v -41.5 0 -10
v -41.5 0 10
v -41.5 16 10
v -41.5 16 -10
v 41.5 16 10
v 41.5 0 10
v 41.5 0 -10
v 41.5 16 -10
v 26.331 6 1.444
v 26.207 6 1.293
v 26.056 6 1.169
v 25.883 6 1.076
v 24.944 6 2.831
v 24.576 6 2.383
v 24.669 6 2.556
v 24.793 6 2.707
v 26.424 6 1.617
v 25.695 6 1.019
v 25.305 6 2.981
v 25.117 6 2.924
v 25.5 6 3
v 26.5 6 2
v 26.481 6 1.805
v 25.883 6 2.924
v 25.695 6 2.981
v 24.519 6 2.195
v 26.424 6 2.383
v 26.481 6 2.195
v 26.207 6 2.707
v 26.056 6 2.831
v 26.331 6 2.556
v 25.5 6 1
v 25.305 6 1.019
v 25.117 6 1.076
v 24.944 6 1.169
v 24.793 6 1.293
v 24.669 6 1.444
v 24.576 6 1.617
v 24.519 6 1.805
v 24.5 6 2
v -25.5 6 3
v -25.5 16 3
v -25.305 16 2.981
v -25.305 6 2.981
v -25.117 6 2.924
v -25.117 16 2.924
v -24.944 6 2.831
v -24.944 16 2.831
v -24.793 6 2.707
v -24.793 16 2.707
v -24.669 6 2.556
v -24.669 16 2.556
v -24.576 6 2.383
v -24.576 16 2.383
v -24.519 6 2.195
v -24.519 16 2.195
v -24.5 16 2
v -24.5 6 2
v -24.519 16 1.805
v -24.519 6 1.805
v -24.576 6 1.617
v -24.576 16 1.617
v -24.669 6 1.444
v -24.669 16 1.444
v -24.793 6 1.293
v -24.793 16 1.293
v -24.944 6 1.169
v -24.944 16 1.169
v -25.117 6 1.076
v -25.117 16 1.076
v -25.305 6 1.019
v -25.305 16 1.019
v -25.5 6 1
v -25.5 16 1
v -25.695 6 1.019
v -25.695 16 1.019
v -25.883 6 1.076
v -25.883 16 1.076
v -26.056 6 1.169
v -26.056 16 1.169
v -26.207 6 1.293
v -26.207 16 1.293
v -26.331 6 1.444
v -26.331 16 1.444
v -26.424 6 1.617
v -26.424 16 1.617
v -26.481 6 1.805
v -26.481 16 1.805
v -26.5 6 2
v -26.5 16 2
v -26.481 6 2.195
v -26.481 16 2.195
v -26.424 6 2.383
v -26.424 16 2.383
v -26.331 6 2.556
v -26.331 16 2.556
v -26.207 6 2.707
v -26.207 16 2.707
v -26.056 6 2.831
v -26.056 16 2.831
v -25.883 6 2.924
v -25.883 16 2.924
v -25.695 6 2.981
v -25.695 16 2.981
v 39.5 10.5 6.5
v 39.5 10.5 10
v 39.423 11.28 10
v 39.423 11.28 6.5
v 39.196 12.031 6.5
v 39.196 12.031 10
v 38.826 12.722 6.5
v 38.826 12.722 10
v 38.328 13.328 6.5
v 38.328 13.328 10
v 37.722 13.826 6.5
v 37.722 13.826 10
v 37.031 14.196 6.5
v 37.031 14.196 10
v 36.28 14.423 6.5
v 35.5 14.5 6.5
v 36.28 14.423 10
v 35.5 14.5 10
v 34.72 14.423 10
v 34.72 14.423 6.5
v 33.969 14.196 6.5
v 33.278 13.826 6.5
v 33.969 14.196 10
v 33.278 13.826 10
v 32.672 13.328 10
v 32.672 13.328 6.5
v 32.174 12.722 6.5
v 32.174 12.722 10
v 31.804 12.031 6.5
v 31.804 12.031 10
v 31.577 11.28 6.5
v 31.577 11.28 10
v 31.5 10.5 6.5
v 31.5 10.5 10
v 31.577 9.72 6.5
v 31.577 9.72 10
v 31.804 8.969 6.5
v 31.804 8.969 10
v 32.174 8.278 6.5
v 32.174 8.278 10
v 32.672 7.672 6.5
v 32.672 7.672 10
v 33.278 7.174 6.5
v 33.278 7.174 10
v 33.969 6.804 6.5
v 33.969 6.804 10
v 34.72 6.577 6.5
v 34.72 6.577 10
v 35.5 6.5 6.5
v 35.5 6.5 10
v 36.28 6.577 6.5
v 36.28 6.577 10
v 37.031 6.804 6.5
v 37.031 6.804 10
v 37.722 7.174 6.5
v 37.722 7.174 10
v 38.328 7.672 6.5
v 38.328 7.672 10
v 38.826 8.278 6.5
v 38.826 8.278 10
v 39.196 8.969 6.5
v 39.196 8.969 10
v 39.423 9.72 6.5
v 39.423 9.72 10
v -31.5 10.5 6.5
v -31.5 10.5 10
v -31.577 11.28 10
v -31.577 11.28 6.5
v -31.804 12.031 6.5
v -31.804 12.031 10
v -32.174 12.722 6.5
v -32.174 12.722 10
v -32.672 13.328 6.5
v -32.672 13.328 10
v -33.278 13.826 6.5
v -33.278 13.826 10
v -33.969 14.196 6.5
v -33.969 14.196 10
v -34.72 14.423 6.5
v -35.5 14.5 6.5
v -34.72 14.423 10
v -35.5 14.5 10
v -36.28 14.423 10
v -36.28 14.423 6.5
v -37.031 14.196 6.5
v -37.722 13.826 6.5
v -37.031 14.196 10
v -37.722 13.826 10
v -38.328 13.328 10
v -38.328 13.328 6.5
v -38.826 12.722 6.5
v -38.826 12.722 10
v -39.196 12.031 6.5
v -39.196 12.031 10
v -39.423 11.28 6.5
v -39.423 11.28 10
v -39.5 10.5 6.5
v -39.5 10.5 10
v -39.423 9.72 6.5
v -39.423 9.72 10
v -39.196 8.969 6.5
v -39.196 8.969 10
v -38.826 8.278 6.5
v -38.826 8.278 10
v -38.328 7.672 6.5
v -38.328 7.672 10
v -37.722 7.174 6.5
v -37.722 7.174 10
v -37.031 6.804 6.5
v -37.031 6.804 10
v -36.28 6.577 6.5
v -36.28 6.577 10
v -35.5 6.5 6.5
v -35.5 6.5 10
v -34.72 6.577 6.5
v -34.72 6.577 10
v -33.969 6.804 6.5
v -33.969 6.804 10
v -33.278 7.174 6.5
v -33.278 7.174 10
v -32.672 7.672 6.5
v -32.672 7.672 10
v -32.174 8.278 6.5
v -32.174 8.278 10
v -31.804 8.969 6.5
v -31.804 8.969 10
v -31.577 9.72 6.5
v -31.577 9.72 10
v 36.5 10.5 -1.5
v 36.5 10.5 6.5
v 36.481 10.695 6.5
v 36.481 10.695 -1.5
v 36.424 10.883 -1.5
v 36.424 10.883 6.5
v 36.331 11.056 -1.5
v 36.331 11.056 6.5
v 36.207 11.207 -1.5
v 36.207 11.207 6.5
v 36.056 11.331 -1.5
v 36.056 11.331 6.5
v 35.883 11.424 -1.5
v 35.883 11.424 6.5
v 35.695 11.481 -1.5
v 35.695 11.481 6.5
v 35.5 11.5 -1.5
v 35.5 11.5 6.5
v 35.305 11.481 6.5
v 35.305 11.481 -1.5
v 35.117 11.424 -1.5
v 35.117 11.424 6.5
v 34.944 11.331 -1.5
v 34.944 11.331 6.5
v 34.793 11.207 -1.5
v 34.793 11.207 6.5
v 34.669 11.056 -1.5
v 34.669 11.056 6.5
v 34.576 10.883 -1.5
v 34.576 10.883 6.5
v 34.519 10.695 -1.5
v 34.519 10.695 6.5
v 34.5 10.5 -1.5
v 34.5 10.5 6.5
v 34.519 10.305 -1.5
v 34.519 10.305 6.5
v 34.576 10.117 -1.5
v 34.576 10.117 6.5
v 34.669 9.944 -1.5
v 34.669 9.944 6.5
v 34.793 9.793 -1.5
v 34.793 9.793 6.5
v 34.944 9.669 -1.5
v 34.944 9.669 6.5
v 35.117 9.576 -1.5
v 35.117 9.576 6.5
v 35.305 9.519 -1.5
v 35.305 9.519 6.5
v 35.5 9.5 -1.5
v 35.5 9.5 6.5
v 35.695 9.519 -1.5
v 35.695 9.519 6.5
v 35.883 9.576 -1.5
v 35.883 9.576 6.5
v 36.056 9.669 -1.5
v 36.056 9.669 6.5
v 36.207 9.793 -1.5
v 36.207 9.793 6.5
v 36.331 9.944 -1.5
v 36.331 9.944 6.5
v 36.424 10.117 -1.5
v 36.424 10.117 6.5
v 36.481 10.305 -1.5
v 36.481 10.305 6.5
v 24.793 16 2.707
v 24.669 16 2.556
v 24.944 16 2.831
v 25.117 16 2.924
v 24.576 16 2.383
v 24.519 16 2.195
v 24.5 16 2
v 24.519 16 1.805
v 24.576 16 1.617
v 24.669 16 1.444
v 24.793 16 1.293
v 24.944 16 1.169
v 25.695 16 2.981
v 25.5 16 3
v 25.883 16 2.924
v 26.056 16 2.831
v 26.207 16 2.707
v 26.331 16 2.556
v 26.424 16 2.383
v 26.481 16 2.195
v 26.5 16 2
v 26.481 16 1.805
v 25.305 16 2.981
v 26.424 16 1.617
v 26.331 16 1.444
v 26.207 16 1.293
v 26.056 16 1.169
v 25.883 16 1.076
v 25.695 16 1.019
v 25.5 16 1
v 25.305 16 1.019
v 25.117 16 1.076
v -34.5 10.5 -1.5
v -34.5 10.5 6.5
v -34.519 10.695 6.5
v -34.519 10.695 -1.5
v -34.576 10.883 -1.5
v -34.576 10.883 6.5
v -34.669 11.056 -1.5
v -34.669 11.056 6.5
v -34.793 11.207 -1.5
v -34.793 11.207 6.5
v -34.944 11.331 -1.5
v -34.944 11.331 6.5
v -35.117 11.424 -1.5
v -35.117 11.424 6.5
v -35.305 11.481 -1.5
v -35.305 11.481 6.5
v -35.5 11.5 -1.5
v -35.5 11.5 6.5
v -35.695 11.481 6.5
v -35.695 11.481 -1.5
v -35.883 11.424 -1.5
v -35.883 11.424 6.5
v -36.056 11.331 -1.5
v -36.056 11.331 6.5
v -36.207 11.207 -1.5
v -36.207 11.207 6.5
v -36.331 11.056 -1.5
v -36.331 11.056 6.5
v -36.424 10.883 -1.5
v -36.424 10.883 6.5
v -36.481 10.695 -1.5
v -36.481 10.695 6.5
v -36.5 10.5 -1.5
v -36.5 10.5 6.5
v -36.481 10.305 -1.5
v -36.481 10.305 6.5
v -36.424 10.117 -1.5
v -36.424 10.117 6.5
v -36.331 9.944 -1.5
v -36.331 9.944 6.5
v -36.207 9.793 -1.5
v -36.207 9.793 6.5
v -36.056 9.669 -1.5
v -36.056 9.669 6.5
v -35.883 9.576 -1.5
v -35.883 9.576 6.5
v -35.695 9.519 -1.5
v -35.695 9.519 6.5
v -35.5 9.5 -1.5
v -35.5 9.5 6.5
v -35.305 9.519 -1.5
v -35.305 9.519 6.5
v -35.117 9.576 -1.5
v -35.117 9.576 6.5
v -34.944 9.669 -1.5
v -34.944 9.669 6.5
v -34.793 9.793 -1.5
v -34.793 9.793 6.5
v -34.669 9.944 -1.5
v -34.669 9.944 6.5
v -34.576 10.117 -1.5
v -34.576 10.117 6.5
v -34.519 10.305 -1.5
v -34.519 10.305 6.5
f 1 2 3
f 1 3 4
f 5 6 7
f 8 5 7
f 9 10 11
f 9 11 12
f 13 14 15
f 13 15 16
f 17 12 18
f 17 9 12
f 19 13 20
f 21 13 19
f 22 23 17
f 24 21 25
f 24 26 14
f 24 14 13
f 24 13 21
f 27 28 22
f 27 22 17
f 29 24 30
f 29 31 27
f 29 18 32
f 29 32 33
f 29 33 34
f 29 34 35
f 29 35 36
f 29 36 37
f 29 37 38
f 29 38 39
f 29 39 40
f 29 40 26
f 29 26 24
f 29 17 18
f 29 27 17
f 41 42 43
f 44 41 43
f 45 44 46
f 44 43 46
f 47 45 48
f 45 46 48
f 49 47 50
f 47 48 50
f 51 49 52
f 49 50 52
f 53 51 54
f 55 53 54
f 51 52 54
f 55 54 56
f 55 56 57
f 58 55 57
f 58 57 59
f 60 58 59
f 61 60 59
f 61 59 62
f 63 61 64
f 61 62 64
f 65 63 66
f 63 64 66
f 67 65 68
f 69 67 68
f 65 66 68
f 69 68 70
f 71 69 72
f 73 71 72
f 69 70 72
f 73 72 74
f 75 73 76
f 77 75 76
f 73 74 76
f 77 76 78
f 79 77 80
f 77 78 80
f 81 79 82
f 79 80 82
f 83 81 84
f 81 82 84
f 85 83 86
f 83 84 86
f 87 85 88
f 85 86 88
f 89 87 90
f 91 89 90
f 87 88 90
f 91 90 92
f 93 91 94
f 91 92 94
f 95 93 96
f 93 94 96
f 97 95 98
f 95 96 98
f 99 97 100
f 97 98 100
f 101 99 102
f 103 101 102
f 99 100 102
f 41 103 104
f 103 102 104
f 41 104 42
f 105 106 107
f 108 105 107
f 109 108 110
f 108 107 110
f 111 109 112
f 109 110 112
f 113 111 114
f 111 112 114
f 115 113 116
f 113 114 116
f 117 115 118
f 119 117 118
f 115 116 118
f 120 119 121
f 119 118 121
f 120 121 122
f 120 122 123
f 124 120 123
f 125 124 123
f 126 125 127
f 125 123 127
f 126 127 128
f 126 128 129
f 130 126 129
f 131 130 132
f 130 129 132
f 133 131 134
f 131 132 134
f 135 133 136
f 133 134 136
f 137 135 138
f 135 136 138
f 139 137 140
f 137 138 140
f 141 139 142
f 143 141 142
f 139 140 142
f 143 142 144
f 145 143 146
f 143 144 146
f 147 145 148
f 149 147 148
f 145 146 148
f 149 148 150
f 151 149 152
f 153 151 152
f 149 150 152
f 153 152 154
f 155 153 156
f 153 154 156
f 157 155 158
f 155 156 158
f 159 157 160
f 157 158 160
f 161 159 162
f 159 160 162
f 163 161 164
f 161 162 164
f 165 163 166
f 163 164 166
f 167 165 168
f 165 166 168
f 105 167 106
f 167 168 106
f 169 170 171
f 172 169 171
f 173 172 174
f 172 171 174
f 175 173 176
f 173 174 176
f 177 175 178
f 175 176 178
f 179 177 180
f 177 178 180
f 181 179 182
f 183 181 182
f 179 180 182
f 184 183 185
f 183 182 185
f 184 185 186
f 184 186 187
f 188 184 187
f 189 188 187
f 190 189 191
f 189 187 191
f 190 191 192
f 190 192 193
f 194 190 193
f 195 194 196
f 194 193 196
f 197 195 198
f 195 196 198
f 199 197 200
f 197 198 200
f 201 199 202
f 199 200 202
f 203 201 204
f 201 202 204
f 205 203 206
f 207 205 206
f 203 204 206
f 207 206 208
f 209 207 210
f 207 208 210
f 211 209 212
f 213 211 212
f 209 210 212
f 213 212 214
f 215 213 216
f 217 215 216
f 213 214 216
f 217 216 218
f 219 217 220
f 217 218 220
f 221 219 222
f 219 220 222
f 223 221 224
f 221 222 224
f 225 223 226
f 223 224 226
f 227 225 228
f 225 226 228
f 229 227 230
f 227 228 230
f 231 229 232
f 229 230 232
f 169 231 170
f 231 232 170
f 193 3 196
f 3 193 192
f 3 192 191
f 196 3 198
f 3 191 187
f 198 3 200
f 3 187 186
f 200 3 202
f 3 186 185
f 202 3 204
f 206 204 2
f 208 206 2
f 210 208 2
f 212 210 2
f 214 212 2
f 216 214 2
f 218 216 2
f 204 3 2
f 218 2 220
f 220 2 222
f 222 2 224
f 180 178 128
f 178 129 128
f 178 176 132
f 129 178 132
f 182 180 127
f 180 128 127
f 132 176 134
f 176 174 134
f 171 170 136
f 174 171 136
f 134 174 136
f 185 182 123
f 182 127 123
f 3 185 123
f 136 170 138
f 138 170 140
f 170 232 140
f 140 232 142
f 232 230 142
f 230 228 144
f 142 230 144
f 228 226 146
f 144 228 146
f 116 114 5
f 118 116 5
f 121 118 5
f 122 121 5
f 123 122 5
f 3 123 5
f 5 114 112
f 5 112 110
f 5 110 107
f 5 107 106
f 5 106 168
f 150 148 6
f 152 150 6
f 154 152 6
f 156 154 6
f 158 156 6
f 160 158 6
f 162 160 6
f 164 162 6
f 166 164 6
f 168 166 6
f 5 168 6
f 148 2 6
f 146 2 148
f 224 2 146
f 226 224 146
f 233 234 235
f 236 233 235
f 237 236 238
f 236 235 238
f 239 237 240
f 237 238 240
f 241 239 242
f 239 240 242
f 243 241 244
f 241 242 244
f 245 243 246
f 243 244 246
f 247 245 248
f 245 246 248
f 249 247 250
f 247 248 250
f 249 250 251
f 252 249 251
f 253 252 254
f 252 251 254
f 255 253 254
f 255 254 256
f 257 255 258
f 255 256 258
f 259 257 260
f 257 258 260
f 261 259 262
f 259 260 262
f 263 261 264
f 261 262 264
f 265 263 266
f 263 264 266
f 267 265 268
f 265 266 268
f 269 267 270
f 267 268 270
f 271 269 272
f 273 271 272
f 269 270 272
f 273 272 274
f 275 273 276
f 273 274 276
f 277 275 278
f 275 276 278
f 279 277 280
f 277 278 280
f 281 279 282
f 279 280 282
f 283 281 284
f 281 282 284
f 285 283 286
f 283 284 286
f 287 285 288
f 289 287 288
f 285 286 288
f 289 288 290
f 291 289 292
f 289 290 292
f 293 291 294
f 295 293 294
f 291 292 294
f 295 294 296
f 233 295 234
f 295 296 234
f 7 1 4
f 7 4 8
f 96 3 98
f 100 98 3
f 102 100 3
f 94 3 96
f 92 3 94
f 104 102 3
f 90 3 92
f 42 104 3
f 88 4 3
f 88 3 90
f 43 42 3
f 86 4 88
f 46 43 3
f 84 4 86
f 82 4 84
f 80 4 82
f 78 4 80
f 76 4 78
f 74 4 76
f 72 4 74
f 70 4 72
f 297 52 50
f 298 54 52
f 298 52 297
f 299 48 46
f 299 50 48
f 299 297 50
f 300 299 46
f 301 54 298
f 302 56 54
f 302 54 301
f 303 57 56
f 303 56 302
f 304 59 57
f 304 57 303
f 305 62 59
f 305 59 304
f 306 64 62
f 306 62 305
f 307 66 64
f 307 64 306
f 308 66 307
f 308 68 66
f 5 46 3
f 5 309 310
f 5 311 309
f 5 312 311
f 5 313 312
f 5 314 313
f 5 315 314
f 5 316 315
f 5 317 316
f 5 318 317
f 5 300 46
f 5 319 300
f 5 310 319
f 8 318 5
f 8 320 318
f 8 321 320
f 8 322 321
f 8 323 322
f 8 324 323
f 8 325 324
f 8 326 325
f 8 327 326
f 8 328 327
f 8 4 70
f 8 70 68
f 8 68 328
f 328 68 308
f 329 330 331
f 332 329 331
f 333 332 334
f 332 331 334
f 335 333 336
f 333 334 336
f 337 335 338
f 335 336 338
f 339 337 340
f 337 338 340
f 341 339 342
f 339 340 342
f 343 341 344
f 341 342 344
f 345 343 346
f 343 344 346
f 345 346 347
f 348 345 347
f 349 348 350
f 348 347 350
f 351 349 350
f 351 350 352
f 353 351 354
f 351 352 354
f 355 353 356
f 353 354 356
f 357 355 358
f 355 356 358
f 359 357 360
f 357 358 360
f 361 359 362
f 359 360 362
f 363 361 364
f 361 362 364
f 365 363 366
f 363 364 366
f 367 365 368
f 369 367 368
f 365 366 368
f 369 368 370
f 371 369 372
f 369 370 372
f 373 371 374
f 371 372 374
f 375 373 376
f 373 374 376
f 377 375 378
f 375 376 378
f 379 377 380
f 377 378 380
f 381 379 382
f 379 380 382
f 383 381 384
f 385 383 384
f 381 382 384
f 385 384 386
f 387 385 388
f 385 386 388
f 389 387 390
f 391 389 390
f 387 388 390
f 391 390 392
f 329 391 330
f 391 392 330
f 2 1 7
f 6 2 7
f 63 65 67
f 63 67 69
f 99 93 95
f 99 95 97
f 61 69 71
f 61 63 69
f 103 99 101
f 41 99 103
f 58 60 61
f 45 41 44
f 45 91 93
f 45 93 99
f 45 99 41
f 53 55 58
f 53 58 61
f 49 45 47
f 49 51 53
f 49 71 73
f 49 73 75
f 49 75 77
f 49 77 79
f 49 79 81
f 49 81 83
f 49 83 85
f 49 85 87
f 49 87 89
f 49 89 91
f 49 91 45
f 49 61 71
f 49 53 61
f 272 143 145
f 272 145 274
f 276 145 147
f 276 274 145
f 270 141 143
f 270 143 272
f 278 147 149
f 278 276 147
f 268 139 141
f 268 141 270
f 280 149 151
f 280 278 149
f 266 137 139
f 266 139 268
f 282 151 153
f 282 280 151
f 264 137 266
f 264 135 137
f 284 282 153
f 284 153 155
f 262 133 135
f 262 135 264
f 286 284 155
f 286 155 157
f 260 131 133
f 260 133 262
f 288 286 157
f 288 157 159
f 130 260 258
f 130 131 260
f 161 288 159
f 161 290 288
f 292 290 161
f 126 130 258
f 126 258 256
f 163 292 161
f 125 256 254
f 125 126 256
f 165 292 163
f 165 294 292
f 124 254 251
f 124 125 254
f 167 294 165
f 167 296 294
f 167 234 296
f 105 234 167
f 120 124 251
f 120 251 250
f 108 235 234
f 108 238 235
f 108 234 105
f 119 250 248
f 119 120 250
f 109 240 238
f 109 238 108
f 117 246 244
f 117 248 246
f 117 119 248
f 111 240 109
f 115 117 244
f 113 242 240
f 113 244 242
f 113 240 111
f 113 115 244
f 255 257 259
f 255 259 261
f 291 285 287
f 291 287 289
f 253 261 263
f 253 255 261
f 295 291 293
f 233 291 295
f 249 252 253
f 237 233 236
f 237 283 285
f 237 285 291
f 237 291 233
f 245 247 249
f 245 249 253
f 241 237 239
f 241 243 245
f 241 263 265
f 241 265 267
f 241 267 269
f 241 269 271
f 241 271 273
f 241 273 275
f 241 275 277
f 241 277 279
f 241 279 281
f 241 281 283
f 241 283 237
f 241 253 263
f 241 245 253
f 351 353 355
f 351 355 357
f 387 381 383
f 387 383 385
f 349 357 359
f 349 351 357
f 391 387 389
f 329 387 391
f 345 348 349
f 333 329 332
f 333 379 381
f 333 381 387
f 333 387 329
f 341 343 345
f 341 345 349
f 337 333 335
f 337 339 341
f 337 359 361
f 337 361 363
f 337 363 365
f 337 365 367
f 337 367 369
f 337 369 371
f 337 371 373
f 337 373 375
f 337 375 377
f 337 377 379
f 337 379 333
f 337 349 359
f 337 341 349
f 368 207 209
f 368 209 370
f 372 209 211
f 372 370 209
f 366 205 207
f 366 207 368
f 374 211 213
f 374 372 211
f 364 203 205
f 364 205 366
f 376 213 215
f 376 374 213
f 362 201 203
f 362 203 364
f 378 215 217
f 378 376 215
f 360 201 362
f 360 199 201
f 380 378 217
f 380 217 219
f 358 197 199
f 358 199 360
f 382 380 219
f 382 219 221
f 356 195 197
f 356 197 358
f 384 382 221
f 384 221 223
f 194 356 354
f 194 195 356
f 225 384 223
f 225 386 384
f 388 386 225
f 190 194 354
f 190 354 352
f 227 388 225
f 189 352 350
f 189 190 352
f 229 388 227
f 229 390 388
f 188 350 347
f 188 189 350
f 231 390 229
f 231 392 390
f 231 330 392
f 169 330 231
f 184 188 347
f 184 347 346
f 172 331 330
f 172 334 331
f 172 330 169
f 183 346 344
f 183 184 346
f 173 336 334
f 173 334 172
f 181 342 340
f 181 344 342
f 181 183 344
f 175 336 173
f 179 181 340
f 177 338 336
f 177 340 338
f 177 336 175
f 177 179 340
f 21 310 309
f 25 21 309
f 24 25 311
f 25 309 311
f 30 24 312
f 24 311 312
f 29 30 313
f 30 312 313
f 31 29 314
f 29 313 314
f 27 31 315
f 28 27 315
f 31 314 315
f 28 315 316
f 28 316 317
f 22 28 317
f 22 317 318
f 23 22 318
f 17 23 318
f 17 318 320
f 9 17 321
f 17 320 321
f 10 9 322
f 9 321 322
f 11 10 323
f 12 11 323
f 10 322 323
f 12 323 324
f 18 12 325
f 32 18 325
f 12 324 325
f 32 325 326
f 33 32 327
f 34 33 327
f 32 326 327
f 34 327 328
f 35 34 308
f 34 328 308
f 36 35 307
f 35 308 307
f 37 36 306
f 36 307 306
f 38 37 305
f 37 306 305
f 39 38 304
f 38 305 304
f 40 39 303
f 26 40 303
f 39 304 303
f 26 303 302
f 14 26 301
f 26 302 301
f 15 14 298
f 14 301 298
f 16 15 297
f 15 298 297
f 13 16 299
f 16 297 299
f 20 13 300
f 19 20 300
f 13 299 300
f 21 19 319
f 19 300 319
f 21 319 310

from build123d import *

# Parameters (mm, degrees)
SKETCH_1_W          = 83
SKETCH_1_H          = 20
EXTRUDE_1_DEPTH     = 16
SKETCH_2_R          = 4
CUT_EXTRUDE_1_DEPTH = 3.5
SKETCH_3_R          = 1
CUT_EXTRUDE_2_DEPTH = 10
SKETCH_6_R          = 1
CUT_EXTRUDE_5_DEPTH = 8


with BuildPart() as part:
    # 스케치1 → 보스-돌출1 (new body)
    with BuildSketch(Plane(origin=(0, 0, 0), x_dir=(1, 0, 0), z_dir=(0, 1, 0))):
        Rectangle(SKETCH_1_W, SKETCH_1_H)
    extrude(amount=EXTRUDE_1_DEPTH)

    # 스케치2 → 컷-돌출1 (cut)
    with BuildSketch(Plane.XY.offset(10)):
        with Locations((-35.5, 10.5)):
            Circle(SKETCH_2_R)
        with Locations((35.5, 10.5)):
            Circle(SKETCH_2_R)
    extrude(amount=-CUT_EXTRUDE_1_DEPTH, mode=Mode.SUBTRACT)

    # 스케치3 → 컷-돌출2 (cut)
    with BuildSketch(Plane(origin=(0, 16, 0), x_dir=(1, 0, 0), z_dir=(0, 1, 0))):
        with Locations(Location((-25.5, -2, 0), (0, 0, 270))):
            Circle(SKETCH_3_R)
        with Locations(Location((25.5, -2, 0), (0, 0, 270))):
            Circle(SKETCH_3_R)
    extrude(amount=-CUT_EXTRUDE_2_DEPTH, mode=Mode.SUBTRACT)

    # 스케치6 → 컷-돌출5 (cut)
    with BuildSketch(Plane.XY.offset(6.5)):
        with Locations((-35.5, 10.5)):
            Circle(SKETCH_6_R)
        with Locations((35.5, 10.5)):
            Circle(SKETCH_6_R)
    extrude(amount=-CUT_EXTRUDE_5_DEPTH, mode=Mode.SUBTRACT)


solid = part.part
